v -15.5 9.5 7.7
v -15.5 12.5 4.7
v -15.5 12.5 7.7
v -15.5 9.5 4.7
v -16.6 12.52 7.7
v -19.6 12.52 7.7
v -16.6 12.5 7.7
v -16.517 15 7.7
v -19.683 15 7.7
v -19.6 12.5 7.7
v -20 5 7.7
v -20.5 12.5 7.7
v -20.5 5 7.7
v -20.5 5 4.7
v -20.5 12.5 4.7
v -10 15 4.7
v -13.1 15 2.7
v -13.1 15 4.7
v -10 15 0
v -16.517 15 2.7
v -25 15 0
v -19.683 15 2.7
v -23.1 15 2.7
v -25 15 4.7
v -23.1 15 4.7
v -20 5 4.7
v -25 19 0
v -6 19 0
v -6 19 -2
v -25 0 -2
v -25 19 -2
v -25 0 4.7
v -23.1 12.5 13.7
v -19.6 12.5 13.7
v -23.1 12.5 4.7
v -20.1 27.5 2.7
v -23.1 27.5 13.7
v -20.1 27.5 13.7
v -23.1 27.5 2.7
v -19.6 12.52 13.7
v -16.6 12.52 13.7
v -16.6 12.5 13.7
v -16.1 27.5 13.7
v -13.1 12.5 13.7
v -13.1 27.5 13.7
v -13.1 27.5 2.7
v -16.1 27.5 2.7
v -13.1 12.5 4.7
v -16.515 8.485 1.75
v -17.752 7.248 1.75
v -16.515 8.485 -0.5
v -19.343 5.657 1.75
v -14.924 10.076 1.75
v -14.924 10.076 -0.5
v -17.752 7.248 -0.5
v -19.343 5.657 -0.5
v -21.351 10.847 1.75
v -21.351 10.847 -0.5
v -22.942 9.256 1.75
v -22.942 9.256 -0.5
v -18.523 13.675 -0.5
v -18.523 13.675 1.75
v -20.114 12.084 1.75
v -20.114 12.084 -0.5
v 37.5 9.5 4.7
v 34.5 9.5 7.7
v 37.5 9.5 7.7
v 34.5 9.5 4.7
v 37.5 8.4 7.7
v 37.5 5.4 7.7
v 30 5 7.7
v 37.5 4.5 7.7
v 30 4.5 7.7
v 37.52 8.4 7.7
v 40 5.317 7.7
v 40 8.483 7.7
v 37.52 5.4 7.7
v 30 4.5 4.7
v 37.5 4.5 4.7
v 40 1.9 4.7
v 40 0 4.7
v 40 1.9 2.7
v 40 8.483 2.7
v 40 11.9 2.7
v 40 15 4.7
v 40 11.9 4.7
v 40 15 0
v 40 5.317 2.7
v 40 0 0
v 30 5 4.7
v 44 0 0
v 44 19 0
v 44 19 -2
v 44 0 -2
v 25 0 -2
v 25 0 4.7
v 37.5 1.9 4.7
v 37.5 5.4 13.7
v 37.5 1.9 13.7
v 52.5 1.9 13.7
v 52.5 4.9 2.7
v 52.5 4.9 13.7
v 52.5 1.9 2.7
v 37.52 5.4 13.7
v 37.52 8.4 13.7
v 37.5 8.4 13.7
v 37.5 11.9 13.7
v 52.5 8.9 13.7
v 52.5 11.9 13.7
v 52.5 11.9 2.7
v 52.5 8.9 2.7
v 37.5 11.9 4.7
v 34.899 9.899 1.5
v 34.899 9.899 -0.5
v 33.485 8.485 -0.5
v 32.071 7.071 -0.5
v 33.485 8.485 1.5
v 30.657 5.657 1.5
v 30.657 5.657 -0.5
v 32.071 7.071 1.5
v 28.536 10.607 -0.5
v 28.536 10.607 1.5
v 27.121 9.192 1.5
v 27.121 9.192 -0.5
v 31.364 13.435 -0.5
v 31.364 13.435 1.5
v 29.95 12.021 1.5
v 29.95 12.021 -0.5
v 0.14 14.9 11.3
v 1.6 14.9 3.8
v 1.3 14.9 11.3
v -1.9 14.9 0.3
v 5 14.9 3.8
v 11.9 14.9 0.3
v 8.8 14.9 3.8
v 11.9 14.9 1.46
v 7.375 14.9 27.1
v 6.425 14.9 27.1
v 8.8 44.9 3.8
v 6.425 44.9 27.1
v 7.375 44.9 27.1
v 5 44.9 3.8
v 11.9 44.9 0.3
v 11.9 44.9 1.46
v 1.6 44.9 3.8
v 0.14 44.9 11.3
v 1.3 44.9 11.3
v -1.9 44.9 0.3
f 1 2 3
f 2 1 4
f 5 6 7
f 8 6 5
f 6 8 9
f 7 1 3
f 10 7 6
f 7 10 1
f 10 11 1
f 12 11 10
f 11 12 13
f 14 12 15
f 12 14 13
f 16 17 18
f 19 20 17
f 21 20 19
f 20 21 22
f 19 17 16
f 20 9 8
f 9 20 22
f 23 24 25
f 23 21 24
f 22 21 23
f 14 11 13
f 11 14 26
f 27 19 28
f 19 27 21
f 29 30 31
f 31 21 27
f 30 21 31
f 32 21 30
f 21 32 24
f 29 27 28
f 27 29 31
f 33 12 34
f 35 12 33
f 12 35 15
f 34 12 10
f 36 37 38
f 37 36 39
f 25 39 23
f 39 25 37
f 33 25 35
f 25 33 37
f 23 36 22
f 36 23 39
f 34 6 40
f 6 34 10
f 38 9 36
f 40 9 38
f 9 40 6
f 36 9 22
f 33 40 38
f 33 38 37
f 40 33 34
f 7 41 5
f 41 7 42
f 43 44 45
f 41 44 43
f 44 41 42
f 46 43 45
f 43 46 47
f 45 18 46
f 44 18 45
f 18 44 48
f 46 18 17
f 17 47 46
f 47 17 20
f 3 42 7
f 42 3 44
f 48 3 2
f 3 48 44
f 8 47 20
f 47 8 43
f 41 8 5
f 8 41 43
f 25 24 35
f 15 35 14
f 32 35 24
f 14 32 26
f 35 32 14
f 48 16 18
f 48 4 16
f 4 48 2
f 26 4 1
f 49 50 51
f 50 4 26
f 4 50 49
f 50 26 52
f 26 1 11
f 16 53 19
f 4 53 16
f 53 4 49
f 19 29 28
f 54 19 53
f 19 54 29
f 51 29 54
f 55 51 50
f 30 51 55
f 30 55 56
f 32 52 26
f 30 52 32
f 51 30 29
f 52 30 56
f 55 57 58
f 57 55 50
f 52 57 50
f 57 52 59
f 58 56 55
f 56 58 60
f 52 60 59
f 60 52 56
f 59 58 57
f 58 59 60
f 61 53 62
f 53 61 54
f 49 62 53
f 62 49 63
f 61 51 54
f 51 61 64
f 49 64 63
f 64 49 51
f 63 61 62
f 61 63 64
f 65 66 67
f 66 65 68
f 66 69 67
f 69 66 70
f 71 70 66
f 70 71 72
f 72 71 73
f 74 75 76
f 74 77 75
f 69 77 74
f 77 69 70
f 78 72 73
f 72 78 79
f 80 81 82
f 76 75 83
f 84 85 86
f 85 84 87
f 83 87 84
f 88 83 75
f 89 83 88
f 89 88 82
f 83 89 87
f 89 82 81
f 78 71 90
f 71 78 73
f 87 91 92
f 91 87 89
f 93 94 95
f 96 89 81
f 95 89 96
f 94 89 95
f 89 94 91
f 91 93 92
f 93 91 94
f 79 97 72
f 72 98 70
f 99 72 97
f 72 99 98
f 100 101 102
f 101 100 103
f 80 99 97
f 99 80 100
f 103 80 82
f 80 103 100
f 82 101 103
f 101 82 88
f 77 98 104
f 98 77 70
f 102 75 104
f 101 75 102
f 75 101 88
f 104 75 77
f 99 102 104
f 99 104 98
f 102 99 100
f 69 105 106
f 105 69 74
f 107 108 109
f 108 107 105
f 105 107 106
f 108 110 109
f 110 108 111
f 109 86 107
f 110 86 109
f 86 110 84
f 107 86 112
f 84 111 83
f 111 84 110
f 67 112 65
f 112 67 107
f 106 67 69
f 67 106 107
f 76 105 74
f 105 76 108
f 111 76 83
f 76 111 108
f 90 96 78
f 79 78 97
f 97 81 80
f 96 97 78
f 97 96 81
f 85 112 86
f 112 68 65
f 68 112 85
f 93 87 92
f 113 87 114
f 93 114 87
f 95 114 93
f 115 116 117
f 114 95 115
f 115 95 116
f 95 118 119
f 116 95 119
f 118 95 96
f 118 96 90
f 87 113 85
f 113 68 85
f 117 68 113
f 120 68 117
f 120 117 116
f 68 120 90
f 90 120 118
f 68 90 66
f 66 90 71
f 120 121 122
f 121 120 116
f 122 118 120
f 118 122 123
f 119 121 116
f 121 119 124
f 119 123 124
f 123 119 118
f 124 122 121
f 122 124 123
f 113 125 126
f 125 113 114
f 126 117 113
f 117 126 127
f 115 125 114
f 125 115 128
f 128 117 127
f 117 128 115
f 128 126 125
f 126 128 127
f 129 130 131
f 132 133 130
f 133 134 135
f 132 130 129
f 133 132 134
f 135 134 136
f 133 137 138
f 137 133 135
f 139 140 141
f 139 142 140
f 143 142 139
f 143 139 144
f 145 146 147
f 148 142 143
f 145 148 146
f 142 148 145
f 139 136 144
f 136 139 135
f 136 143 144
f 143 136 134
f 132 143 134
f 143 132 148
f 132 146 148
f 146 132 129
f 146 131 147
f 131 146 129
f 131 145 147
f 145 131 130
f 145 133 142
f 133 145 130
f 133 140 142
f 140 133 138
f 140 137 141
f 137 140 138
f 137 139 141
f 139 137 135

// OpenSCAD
// Standalone corner print (pegged pair) — geometry from rim_piece_assembly.scad
include <rim_piece_assembly.scad>

// Print both halves; keep stem grippers for separate edge mating.
// Fit preview uses rim_piece_assembly via edge_fit_preview().
corner_print_pair(include_stem_grippers = true);
